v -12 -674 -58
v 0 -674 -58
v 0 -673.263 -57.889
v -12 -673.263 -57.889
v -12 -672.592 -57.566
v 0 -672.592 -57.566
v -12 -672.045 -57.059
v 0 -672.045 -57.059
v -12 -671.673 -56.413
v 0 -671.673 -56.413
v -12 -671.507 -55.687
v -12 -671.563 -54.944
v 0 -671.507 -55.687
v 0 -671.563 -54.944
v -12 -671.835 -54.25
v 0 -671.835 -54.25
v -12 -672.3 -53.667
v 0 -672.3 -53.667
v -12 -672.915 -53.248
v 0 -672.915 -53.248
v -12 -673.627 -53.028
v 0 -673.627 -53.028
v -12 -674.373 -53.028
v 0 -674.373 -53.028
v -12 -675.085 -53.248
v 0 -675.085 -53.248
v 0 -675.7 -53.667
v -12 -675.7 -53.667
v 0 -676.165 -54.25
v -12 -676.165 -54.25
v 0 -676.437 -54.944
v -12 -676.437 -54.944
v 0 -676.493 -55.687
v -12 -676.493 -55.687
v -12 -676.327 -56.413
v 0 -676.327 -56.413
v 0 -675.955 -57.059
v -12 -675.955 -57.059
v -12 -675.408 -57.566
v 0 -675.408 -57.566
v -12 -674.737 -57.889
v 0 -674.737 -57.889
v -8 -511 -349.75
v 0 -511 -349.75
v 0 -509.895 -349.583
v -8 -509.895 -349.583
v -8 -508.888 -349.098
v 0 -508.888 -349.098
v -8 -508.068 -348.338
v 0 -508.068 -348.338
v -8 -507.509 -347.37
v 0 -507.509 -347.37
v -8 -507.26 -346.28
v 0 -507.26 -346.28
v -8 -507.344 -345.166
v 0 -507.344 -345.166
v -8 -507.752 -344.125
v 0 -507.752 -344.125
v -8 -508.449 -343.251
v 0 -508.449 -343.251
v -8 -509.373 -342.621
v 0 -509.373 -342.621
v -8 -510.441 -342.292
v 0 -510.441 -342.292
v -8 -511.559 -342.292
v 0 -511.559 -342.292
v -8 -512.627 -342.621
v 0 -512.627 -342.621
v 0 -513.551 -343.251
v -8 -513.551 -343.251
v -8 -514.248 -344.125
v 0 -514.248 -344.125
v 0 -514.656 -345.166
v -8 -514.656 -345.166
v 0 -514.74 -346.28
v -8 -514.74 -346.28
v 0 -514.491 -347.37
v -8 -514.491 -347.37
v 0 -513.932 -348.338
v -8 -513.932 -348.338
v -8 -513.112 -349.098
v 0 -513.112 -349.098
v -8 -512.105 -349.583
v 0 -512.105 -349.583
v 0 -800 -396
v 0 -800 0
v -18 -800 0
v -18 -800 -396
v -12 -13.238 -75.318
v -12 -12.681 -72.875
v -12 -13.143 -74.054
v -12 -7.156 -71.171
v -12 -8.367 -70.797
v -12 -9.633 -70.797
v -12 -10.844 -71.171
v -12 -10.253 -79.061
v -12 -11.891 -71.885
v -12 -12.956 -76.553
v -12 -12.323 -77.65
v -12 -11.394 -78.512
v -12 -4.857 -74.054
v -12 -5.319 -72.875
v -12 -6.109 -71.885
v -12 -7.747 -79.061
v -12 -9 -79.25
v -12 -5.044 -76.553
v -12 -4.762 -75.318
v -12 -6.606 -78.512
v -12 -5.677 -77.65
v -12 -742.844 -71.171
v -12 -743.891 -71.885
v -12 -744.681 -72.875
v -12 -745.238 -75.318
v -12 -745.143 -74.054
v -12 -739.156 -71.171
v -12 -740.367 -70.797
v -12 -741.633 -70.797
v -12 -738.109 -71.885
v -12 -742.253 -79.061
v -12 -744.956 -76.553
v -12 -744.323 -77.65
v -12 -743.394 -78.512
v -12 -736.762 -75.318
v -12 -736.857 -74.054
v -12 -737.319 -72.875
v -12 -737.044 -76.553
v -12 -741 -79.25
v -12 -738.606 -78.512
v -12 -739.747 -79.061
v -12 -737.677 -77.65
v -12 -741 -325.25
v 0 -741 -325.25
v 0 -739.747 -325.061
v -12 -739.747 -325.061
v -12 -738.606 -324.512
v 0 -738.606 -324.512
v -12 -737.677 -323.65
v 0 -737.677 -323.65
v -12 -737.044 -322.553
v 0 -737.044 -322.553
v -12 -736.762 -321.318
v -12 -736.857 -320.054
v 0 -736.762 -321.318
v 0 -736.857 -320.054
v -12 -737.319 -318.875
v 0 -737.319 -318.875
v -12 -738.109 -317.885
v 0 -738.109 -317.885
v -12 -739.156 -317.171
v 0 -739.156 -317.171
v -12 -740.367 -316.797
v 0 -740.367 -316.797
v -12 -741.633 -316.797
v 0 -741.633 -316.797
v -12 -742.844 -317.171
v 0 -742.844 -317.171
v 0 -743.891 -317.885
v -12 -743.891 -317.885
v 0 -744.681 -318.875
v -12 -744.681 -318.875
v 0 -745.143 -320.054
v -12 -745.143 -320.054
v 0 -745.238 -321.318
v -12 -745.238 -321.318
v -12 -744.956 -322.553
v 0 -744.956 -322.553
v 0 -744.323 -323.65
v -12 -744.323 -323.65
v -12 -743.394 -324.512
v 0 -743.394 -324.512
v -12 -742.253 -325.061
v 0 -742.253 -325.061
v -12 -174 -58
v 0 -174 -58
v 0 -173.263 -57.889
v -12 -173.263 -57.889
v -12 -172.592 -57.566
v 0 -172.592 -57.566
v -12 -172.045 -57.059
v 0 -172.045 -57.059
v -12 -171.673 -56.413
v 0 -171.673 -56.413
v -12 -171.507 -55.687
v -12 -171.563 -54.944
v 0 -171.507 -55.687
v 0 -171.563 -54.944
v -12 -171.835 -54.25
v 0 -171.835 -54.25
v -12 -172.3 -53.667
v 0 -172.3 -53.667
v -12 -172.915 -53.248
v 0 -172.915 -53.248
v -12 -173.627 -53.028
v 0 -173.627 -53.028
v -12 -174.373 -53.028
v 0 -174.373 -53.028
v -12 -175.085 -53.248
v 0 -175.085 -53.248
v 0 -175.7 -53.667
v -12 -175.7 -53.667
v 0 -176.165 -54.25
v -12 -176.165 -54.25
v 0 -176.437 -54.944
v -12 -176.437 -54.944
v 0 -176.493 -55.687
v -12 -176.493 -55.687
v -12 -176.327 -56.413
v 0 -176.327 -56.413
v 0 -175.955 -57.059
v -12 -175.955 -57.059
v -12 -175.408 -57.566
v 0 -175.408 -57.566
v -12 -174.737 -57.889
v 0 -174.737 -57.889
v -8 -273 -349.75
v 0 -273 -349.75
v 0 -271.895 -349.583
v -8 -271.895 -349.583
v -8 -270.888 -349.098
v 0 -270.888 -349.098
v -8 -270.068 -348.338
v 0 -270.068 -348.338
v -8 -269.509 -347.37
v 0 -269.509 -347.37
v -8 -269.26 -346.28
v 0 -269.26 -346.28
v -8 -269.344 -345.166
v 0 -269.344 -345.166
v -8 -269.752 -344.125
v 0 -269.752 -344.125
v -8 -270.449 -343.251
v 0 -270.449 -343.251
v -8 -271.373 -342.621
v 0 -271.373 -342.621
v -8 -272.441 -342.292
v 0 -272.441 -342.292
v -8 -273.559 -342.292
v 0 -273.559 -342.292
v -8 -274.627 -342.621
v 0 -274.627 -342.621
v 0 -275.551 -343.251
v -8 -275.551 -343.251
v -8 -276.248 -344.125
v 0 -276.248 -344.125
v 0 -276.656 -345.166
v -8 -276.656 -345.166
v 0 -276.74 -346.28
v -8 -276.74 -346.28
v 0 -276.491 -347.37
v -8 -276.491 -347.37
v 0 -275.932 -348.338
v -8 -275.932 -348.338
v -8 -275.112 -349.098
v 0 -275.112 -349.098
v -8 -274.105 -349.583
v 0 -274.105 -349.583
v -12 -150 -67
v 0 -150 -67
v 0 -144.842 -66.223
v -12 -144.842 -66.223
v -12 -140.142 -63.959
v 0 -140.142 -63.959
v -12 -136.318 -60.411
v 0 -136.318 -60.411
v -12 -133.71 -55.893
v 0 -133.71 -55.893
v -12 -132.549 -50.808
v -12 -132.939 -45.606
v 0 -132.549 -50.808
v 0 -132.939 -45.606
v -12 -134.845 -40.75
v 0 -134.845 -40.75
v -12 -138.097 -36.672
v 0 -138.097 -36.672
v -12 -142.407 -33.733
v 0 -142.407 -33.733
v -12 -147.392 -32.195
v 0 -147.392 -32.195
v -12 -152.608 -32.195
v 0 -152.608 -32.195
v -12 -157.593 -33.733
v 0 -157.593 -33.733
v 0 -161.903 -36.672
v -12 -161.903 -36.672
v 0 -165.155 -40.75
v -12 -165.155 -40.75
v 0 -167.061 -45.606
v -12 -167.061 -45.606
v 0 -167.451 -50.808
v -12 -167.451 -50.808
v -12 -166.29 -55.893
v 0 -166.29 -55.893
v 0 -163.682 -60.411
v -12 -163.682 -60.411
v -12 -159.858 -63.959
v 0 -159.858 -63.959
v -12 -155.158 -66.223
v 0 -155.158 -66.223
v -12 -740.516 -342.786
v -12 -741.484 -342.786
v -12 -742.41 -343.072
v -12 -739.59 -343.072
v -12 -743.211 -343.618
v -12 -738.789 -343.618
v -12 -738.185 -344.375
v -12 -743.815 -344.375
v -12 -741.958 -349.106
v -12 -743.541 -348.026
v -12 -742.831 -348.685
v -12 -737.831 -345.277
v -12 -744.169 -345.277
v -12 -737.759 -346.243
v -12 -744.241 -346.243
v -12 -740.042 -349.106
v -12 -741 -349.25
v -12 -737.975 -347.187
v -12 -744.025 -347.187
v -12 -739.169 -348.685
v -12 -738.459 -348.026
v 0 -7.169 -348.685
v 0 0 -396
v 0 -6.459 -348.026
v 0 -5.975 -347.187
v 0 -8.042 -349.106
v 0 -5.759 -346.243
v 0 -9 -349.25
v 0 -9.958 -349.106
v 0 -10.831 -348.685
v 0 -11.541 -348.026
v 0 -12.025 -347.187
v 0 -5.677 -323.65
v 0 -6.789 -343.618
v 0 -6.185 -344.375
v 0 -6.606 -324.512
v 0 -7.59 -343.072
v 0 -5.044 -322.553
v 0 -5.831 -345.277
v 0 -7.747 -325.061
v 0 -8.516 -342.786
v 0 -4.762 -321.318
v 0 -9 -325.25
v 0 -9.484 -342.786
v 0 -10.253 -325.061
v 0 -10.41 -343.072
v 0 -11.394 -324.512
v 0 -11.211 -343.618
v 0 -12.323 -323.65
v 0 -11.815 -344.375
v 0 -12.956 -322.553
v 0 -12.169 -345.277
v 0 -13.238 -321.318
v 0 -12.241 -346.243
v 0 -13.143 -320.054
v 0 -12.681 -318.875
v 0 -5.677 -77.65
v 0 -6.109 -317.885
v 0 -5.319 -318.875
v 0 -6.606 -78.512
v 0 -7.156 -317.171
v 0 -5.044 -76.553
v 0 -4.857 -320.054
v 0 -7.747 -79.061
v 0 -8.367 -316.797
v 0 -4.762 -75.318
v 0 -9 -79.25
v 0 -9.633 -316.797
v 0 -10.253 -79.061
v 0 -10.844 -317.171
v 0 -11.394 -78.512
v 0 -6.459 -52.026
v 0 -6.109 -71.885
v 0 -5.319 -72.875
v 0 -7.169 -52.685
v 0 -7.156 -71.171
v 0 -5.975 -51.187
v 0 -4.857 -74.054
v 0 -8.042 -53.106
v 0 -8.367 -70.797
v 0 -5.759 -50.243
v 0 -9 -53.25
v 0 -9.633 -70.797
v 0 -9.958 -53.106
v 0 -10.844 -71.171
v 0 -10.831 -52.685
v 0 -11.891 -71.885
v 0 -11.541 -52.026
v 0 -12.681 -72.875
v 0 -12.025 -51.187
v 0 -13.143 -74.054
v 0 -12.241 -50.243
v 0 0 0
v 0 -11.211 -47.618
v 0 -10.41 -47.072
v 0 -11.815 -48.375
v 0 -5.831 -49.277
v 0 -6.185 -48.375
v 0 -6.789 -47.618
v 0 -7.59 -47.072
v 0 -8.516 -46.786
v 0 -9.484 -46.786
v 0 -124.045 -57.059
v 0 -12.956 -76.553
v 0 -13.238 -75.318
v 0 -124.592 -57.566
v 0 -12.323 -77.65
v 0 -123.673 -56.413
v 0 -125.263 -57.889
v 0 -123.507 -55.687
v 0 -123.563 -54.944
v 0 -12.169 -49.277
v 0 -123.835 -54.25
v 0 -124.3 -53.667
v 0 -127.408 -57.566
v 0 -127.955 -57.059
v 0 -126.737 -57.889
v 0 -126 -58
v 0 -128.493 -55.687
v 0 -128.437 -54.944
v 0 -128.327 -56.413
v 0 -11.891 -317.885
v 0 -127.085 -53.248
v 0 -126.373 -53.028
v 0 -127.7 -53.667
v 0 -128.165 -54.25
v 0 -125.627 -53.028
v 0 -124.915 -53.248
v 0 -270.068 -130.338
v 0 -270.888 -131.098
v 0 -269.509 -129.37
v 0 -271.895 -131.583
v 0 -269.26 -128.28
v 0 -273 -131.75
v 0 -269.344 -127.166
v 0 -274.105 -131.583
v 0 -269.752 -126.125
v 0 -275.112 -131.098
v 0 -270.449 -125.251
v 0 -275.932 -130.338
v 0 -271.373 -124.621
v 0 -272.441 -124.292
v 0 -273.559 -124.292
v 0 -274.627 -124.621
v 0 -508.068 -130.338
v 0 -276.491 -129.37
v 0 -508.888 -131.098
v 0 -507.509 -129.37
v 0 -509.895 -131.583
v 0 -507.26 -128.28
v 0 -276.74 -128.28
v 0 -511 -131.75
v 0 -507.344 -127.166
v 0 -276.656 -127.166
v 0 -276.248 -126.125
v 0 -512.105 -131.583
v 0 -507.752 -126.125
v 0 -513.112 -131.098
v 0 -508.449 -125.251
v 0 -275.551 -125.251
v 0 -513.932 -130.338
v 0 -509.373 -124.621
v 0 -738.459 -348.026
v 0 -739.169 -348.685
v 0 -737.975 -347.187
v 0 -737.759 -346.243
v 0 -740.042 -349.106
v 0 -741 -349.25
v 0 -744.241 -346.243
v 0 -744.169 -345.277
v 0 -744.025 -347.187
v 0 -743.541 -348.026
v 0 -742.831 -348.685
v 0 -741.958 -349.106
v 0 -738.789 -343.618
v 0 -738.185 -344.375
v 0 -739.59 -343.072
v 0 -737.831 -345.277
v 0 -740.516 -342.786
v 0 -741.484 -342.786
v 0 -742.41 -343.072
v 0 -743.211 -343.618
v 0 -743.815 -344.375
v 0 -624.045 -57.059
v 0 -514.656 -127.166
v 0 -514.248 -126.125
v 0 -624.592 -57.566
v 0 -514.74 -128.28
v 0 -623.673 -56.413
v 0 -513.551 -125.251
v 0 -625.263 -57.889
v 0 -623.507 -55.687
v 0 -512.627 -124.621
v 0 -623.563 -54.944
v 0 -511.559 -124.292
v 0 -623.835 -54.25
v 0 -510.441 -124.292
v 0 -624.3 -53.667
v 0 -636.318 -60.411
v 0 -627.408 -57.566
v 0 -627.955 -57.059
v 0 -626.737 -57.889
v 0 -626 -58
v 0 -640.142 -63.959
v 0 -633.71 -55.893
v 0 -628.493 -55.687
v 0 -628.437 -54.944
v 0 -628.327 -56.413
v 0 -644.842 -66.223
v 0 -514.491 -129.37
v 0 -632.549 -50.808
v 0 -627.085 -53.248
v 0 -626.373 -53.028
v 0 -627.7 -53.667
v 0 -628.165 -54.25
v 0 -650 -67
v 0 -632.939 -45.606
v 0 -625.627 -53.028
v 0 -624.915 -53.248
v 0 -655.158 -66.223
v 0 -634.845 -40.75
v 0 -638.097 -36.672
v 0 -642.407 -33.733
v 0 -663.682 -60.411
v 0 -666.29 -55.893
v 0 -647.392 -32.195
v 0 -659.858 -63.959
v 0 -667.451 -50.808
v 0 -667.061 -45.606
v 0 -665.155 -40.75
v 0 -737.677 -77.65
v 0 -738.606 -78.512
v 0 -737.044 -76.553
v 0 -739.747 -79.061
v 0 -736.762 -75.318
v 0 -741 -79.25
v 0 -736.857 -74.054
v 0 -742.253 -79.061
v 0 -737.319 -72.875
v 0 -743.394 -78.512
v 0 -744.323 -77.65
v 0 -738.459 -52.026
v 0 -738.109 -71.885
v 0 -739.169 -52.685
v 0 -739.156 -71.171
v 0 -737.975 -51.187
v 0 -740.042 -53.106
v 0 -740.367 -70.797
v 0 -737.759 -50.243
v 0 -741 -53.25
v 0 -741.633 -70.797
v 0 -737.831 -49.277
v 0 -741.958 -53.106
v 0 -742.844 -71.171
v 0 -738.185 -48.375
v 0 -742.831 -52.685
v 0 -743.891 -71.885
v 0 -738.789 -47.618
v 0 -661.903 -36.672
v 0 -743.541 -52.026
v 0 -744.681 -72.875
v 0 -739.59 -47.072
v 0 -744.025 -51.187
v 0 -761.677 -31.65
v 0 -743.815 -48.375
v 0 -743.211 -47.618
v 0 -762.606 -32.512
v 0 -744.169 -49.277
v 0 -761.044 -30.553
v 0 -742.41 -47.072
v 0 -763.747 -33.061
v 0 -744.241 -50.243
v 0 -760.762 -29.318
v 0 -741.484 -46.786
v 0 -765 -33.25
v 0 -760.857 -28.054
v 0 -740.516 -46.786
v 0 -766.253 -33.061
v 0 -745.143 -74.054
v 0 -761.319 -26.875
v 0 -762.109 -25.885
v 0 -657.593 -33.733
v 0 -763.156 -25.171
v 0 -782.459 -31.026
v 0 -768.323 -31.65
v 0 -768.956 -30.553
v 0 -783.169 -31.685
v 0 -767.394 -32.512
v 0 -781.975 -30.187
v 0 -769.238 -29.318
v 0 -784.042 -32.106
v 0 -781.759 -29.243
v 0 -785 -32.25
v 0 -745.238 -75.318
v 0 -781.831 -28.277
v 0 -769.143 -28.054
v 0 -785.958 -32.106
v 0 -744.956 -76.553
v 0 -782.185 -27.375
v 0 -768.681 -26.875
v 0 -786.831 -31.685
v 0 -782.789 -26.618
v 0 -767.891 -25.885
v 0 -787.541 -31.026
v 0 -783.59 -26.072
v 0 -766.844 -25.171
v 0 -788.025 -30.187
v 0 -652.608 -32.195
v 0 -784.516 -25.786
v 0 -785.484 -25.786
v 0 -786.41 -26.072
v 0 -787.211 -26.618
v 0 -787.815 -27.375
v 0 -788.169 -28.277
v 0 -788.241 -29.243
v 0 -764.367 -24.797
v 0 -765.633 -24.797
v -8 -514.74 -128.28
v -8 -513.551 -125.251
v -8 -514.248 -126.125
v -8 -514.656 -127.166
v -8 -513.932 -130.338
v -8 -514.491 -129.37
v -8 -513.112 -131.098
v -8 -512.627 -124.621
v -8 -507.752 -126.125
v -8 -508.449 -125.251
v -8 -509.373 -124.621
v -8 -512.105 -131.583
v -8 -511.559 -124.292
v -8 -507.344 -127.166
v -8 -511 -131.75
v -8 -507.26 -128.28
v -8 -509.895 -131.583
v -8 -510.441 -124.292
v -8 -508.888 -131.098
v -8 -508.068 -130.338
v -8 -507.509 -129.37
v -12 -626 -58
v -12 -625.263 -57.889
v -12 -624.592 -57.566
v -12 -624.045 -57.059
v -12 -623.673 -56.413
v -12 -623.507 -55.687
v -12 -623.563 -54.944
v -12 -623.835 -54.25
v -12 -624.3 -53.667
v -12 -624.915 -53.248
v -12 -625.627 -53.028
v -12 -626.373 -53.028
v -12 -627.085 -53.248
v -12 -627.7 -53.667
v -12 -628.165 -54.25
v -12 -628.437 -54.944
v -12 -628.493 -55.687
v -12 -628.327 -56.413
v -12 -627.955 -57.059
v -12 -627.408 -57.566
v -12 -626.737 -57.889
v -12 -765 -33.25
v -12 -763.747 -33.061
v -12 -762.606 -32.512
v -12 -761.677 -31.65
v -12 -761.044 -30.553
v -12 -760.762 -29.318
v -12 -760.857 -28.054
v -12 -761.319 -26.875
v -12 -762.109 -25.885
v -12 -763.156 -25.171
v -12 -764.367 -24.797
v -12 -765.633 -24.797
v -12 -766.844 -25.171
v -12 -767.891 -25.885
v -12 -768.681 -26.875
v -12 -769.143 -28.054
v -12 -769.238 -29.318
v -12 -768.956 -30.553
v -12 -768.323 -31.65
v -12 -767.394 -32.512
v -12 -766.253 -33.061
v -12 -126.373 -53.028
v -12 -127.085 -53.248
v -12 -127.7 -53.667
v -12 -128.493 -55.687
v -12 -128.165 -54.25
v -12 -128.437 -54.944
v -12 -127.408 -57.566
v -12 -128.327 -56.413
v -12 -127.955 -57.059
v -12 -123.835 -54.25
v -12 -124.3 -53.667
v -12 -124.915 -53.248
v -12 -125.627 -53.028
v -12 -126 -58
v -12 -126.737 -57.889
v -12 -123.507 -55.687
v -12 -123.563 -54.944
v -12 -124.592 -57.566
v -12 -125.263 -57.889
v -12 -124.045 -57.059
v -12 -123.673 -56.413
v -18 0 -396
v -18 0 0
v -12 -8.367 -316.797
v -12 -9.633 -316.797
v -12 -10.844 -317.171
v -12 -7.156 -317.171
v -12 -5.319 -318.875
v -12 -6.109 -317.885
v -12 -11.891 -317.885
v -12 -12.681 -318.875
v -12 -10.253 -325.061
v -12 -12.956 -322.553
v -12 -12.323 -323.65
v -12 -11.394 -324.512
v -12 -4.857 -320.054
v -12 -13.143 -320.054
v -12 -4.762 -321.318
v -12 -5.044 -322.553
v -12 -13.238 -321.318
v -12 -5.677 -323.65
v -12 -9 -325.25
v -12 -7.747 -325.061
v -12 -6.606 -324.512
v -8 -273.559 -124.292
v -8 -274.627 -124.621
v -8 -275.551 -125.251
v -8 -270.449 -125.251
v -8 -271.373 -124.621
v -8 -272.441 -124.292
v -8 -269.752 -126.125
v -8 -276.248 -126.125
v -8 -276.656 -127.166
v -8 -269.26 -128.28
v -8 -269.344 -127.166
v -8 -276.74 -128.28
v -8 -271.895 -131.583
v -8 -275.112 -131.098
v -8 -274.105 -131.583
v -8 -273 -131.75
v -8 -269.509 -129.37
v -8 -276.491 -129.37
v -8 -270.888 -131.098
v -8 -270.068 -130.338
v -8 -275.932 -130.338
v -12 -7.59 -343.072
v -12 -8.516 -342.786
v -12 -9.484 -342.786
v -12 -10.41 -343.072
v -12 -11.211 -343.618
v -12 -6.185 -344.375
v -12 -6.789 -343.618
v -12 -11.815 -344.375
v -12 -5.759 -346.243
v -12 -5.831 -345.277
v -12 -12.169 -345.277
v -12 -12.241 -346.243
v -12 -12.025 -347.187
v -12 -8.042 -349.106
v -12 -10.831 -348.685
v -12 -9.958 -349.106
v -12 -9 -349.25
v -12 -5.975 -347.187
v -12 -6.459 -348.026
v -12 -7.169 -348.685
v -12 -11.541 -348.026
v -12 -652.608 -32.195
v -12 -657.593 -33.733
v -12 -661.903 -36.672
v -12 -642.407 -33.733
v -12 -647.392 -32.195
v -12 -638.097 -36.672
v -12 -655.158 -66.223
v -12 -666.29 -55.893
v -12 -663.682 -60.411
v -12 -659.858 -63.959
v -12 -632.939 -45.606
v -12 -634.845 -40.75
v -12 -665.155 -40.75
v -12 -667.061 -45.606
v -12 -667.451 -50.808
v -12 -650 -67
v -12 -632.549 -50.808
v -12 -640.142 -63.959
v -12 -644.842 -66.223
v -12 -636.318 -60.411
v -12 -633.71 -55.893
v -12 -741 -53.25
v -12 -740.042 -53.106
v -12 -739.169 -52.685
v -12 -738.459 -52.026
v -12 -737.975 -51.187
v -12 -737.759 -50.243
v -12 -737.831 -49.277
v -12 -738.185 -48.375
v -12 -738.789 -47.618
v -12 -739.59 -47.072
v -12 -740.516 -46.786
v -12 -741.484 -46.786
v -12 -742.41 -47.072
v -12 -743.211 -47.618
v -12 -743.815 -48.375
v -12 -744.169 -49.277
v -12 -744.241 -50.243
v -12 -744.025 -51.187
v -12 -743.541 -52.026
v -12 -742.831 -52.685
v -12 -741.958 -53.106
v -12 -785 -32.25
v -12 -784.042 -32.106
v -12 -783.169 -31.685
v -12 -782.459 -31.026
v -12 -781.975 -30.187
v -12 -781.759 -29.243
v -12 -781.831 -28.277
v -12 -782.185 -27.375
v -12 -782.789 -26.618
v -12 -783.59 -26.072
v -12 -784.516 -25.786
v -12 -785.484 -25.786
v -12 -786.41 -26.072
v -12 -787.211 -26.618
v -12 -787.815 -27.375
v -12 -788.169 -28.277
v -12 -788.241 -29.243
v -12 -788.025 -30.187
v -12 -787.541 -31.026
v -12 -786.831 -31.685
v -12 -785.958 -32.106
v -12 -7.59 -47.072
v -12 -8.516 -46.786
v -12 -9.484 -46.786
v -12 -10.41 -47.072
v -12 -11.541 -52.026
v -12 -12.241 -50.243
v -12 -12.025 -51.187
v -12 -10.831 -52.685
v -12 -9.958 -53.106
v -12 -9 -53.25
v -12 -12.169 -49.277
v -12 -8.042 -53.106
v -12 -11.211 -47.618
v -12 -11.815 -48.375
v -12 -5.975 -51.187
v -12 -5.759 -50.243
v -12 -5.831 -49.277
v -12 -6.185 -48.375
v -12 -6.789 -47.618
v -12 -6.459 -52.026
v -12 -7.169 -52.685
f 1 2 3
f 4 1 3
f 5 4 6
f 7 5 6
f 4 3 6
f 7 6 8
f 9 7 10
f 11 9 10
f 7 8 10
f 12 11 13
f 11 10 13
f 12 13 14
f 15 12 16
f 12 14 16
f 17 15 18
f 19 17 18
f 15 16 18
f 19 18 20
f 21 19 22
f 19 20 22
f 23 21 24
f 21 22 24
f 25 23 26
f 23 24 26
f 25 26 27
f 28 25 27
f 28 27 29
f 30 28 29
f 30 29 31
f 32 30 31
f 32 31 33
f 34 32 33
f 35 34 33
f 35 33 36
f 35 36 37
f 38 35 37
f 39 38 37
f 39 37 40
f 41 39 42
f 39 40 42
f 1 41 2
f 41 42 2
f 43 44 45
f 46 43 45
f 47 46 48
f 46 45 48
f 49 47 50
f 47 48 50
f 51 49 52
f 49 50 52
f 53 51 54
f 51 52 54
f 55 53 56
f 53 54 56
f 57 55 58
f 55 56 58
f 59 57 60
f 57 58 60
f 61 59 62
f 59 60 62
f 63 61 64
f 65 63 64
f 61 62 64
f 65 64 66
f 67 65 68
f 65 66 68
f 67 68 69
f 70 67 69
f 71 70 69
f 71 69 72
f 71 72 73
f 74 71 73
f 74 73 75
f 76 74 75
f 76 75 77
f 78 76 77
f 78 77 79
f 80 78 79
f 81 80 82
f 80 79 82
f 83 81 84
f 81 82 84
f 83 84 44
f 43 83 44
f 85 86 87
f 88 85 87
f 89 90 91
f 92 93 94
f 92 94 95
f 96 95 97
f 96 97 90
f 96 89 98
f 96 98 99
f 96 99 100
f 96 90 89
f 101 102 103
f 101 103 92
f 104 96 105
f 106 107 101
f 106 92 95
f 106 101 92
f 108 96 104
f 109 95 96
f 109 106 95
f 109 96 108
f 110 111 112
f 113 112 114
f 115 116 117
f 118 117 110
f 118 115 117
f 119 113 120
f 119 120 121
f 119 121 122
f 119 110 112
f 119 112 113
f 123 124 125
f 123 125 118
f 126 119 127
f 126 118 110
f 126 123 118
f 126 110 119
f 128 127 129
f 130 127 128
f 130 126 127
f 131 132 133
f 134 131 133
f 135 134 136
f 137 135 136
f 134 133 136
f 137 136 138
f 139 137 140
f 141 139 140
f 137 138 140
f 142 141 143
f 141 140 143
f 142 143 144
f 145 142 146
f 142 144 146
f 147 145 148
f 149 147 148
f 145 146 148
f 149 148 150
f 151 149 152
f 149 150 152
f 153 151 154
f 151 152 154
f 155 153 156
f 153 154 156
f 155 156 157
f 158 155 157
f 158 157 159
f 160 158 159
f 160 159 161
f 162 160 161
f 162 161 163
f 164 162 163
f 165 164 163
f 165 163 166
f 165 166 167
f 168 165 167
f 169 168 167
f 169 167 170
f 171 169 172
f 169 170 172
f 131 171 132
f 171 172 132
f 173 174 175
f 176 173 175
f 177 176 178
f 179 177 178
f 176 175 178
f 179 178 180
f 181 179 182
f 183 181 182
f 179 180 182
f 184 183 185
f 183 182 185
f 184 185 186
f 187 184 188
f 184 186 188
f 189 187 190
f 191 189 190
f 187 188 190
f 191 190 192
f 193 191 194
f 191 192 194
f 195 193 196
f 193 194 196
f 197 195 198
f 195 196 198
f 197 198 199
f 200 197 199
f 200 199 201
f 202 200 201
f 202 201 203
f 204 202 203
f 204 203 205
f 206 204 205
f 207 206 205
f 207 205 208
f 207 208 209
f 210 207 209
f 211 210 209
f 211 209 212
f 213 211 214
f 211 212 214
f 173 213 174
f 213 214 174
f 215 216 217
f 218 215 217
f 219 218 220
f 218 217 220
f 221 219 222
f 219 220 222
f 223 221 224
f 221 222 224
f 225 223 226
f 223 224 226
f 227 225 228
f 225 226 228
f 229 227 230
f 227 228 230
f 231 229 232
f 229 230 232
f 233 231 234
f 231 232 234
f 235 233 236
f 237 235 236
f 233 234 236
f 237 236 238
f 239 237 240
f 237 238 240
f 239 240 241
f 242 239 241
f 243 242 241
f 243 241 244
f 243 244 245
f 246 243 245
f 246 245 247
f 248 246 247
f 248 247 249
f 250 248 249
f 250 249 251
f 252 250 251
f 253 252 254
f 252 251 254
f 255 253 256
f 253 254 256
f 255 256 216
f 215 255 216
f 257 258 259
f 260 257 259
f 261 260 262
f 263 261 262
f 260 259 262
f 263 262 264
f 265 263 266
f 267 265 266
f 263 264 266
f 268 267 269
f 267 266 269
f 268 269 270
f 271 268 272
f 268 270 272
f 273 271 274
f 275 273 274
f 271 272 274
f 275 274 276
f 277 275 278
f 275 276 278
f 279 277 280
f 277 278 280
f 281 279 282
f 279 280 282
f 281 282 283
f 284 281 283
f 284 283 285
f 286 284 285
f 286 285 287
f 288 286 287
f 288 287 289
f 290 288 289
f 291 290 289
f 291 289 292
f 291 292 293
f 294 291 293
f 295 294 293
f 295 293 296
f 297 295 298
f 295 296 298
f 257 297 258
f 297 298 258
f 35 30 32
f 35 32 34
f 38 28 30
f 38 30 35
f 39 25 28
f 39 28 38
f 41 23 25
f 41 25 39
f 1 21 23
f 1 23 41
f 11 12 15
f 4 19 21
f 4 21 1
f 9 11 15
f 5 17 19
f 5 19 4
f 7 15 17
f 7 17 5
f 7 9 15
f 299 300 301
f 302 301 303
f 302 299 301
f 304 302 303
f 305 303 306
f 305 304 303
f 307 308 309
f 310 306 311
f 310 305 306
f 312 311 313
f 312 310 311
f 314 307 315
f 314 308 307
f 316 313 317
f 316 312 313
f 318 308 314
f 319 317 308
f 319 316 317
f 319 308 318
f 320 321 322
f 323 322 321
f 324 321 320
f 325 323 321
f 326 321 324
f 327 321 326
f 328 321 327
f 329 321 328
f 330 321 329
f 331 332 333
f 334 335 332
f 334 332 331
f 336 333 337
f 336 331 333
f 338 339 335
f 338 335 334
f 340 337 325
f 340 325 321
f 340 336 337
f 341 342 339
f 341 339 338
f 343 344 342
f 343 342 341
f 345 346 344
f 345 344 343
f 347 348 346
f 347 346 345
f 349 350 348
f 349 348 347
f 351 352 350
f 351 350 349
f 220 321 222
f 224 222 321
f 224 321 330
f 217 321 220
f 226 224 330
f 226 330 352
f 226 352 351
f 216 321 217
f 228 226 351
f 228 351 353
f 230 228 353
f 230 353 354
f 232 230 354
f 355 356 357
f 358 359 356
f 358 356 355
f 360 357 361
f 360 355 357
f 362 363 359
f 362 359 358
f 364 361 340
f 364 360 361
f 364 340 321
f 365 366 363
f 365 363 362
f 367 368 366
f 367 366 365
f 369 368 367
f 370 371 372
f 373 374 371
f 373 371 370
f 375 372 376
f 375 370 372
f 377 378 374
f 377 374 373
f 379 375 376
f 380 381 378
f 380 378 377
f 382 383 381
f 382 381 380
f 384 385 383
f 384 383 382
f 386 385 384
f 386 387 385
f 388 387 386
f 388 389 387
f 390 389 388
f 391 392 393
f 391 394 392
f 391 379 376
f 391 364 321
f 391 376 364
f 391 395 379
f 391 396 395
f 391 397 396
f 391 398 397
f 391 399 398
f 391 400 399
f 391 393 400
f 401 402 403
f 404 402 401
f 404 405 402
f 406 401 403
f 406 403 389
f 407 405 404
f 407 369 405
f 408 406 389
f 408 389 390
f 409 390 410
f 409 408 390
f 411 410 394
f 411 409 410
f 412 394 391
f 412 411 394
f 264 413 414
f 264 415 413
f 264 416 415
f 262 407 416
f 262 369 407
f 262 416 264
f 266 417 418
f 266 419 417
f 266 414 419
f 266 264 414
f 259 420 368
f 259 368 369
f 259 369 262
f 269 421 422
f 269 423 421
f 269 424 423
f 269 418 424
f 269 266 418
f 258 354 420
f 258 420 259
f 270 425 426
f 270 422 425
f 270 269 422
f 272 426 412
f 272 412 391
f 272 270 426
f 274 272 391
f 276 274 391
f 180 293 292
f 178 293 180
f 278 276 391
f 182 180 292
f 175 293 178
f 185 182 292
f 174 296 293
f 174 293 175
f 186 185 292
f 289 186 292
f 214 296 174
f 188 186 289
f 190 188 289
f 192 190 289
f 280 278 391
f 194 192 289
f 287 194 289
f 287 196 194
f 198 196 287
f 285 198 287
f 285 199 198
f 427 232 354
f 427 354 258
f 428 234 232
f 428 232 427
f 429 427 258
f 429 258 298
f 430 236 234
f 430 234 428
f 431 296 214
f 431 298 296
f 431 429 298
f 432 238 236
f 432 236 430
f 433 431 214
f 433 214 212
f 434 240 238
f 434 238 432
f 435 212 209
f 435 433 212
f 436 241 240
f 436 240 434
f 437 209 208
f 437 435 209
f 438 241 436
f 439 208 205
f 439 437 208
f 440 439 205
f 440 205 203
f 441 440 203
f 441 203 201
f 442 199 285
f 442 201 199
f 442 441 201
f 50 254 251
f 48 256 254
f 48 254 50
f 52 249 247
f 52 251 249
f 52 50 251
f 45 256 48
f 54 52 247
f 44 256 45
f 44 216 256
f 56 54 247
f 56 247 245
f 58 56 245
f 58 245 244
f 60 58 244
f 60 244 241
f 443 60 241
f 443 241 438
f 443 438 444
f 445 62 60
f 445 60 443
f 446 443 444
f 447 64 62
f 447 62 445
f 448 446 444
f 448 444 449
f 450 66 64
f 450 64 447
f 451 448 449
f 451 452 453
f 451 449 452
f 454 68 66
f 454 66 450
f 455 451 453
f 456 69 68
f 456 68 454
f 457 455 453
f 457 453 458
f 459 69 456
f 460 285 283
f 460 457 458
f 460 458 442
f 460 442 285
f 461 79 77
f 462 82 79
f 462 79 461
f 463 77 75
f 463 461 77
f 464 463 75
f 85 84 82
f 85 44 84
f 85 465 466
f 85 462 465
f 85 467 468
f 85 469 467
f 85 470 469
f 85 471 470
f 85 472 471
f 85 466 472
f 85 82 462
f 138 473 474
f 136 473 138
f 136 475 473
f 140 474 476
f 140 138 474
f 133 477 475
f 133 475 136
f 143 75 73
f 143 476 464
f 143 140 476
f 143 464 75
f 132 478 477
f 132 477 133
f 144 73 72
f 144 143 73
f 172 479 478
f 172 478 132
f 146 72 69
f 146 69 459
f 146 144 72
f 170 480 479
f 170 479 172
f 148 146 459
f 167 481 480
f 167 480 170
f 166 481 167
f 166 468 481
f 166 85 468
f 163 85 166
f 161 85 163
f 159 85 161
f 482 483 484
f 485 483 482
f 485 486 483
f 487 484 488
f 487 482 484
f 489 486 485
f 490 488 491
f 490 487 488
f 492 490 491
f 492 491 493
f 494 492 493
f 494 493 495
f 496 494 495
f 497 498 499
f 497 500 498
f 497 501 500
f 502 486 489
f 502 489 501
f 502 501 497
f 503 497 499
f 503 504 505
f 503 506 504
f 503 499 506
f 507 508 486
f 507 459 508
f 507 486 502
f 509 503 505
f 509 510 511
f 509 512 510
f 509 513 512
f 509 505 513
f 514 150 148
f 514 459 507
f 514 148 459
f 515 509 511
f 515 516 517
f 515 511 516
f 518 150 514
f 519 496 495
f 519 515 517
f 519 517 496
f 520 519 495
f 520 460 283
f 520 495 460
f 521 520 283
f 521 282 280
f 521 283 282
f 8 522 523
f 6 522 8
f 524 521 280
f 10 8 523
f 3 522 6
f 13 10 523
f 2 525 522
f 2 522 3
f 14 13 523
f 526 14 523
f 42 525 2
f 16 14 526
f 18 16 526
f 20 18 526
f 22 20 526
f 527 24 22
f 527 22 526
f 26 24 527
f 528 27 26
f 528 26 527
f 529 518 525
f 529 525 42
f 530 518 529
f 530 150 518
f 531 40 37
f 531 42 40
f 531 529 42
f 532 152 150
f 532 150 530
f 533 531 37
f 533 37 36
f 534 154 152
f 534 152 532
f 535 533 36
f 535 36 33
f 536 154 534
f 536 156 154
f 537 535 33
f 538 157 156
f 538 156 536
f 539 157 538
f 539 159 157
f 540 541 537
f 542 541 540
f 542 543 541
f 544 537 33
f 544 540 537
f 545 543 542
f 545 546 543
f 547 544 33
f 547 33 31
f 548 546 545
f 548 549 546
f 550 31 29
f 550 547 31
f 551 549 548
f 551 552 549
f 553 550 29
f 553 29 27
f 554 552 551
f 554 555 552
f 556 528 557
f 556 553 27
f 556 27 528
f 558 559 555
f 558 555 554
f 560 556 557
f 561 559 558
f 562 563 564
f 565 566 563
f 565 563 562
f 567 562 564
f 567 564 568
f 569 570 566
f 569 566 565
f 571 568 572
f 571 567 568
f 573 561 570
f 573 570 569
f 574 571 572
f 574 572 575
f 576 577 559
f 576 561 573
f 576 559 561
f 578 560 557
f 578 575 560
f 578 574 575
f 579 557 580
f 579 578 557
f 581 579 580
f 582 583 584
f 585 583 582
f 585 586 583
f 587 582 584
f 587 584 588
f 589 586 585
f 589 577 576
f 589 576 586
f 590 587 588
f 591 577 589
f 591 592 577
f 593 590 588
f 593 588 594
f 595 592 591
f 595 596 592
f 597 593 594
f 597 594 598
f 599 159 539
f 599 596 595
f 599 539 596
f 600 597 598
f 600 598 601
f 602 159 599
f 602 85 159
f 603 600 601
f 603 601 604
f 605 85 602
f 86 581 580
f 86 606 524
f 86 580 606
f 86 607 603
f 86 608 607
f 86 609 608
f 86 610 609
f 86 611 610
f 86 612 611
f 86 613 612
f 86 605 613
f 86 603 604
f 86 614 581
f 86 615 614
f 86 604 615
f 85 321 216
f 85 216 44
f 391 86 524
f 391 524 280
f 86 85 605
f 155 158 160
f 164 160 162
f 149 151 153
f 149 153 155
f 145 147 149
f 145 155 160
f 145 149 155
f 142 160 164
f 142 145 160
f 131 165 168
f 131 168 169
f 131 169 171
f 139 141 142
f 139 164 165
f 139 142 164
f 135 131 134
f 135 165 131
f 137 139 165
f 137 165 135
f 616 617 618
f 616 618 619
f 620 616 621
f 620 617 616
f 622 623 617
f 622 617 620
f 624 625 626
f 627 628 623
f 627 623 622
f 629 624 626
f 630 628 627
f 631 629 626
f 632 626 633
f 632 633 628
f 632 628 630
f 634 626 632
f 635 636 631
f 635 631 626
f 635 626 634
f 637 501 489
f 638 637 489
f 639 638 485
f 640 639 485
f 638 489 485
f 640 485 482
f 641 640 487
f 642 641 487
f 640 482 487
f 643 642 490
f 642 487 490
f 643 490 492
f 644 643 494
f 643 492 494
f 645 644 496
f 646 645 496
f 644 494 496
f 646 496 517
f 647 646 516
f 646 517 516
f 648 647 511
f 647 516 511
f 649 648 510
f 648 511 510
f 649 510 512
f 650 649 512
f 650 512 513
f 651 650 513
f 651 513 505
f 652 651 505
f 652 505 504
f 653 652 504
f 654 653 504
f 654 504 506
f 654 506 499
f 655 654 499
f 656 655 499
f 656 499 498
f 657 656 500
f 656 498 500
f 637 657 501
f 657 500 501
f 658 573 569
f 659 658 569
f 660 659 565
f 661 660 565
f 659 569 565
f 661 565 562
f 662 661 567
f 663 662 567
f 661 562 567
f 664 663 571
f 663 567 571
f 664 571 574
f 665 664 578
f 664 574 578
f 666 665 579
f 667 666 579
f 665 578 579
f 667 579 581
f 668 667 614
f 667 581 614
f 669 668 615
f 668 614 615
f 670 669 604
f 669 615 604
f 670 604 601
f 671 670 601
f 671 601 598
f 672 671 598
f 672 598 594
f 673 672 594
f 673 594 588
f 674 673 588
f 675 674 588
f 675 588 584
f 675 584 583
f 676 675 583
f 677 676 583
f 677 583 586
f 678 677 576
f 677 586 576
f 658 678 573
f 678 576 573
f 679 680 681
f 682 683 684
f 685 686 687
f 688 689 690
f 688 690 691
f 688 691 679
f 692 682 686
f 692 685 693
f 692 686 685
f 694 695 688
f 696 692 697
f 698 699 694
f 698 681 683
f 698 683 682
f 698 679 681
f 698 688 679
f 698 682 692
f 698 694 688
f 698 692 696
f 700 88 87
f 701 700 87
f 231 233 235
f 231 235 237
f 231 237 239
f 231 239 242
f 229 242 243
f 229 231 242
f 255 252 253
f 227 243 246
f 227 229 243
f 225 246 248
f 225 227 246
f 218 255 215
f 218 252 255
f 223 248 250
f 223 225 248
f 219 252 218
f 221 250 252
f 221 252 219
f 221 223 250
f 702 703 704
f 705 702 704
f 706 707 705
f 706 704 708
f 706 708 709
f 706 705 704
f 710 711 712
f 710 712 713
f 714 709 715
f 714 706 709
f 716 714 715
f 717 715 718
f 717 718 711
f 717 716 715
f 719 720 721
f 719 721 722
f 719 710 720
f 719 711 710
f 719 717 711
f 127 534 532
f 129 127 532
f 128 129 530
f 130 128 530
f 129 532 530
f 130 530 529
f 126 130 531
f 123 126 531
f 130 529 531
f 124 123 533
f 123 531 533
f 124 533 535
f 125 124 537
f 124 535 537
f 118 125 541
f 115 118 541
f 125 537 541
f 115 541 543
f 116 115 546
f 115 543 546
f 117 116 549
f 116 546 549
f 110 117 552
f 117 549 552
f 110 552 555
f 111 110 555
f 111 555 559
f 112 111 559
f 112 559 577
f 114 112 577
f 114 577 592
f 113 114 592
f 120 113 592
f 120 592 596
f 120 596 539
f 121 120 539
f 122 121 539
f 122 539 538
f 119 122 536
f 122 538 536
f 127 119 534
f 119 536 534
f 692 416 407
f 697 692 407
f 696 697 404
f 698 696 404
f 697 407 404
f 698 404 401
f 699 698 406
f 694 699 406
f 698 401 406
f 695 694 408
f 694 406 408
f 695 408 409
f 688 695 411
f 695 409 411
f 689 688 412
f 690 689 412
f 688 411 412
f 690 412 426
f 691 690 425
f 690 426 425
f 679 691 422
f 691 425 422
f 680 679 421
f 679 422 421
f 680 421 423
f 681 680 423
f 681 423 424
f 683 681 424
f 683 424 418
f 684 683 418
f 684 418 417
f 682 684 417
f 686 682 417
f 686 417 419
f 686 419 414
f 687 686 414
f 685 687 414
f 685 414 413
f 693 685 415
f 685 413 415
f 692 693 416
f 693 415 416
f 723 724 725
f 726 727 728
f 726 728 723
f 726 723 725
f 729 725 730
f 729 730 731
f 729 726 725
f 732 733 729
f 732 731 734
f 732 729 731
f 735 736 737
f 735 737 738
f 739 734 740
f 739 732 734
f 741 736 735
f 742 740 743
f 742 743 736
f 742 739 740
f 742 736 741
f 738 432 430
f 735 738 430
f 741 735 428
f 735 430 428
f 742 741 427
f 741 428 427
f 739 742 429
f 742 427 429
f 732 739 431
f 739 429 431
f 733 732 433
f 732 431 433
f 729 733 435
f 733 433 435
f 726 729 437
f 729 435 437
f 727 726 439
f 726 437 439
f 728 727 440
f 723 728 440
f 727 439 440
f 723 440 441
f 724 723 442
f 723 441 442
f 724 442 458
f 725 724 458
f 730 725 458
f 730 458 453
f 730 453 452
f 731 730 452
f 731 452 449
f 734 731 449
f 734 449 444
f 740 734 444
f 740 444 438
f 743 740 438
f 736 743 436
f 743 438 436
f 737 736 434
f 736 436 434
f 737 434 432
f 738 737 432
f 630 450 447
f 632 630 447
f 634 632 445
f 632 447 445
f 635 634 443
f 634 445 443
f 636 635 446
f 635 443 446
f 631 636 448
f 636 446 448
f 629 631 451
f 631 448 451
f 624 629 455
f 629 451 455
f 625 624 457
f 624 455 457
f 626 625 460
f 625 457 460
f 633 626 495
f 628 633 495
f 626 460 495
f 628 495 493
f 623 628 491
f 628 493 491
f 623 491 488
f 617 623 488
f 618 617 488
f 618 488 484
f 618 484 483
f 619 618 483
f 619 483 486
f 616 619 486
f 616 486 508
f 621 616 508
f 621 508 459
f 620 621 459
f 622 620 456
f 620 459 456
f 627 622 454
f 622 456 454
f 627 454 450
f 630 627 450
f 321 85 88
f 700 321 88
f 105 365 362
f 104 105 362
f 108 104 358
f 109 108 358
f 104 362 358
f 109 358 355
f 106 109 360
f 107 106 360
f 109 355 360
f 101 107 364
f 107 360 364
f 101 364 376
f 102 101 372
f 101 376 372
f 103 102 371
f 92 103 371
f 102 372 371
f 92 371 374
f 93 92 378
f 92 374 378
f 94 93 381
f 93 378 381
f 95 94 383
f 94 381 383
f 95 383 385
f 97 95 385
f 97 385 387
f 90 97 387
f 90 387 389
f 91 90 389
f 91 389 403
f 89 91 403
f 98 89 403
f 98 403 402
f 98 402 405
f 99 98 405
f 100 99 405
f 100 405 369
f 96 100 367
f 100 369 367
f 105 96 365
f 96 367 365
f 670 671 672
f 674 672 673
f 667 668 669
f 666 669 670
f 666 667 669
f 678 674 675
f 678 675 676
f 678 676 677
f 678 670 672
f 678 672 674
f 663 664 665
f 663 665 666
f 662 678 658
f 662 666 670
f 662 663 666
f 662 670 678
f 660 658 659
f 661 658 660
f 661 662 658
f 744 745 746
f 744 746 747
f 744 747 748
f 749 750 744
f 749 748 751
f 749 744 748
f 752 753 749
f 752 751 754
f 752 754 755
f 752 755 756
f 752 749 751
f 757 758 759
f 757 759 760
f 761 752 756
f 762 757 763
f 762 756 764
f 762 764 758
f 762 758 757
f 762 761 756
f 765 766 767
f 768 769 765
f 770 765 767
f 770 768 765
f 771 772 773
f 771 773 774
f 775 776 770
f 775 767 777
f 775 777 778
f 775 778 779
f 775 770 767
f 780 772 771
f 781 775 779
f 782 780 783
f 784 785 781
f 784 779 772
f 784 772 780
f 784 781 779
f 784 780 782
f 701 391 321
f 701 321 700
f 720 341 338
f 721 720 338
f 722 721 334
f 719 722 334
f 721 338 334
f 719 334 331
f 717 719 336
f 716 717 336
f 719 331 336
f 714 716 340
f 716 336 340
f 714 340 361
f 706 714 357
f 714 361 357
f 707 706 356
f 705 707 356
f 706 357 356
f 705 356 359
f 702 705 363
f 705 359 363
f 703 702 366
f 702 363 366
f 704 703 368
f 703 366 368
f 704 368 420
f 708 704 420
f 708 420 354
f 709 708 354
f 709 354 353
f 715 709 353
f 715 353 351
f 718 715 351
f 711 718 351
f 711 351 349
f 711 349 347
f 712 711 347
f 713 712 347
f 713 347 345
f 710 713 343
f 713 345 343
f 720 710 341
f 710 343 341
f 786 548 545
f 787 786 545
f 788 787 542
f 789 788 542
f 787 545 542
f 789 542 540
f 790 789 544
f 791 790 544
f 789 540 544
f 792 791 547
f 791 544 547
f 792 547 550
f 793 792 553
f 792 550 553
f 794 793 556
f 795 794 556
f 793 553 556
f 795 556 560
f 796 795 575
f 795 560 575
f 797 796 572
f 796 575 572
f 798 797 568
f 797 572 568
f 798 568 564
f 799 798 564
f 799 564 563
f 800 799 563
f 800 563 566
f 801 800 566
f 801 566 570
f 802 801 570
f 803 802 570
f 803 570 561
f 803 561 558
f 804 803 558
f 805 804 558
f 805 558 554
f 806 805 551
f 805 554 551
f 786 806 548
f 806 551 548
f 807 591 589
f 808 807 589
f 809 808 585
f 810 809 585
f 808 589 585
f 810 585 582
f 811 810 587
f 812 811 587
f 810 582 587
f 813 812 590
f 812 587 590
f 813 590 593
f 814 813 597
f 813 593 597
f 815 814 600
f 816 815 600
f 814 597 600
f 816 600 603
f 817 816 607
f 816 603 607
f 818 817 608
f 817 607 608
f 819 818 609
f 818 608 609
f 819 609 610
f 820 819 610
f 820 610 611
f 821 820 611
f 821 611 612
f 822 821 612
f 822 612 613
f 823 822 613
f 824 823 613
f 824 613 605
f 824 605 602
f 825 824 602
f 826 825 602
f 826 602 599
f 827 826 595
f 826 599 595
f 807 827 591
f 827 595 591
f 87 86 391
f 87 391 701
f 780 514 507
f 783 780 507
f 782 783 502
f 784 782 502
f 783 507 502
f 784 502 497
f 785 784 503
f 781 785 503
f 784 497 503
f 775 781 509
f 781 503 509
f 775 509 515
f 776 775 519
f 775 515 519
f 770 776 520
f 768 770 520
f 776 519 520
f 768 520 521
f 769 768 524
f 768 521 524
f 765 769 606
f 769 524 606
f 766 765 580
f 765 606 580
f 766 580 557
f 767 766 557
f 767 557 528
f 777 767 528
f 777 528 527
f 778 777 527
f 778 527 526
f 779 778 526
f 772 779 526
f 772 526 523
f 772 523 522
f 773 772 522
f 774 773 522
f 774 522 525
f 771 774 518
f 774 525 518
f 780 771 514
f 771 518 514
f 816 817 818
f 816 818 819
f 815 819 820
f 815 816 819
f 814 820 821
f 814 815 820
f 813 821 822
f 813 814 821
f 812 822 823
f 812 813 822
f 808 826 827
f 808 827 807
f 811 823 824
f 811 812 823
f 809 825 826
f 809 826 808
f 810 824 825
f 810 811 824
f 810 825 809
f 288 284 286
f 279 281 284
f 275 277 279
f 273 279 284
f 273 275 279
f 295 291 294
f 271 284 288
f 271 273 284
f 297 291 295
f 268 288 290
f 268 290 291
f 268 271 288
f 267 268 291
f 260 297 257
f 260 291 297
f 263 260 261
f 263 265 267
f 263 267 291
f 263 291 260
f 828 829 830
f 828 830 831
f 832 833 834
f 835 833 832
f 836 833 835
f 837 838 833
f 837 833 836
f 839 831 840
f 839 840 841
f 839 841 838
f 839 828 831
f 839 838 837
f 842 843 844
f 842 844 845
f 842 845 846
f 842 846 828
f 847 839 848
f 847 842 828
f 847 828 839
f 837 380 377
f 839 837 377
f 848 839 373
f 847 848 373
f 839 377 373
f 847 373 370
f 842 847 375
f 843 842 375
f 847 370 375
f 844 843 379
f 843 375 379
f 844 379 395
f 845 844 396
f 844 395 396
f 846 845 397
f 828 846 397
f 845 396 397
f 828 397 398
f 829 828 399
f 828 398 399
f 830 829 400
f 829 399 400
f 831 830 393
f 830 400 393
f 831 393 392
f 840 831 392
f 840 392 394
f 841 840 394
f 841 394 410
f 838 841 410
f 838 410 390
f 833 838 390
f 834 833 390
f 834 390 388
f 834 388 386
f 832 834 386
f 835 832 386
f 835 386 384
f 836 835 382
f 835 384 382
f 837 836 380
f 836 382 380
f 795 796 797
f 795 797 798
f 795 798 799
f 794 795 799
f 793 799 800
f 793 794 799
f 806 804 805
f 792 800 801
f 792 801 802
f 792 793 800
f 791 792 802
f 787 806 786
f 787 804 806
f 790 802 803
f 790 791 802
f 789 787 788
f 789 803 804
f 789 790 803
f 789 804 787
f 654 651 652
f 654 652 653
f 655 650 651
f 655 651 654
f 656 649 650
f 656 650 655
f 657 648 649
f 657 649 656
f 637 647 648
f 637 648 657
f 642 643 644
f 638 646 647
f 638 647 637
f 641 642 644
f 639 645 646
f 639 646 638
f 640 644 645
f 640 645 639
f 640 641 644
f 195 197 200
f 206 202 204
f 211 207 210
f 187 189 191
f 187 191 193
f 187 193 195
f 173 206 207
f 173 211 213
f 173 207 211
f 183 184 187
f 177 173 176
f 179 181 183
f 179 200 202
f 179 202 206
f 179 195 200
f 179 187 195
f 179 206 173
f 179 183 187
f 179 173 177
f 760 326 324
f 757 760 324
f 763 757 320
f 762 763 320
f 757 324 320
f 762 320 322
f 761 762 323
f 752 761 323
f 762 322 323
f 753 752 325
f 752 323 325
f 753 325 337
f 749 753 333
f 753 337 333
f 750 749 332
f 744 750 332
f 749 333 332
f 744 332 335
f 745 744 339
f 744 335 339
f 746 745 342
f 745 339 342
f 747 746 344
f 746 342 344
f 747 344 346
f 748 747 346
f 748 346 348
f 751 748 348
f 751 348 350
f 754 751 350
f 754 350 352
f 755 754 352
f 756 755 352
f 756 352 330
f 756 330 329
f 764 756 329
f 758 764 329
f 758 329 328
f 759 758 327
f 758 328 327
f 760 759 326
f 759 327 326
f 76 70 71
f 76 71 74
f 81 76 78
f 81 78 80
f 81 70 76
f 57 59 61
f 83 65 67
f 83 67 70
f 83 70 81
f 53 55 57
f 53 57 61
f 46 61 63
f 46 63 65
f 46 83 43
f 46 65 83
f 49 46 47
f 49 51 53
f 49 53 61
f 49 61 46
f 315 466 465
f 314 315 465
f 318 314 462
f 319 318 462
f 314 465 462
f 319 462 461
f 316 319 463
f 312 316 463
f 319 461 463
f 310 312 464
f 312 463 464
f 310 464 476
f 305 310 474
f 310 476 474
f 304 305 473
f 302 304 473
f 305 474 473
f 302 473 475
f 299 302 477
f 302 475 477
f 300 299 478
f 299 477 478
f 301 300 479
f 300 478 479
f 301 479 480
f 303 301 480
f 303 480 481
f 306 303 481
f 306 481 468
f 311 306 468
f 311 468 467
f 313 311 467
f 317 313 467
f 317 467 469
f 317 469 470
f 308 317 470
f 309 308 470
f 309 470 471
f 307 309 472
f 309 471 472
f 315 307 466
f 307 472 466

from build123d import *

# Parameters (mm, degrees)
SKETCH1_W                      = 18
SKETCH1_H                      = 396
LEFT_HAND_END_DEPTH            = 800
SKETCH3_R                      = 3.75
SHELF_MOUNT_HOLES_DEPTH        = 8
SKETCH2_R                      = 3.25
SKETCH2_R_2                    = 4.25
BASE_AND_TOP_MOUNT_HOLES_DEPTH = 12
SKETCH4_R                      = 17.5
SKETCH4_R_2                    = 2.5
HINGE_HOLES_DEPTH              = 12


with BuildPart() as part:
    # Sketch1 → Left Hand End (new body)
    with BuildSketch(Plane(origin=(0, -800, 0), x_dir=(-1, 0, 0), z_dir=(0, 1, 0))):
        with Locations((9, -198)):
            Rectangle(SKETCH1_W, SKETCH1_H)
    extrude(amount=LEFT_HAND_END_DEPTH)

    # Sketch3 → Shelf Mount Holes (cut)
    with BuildSketch(Plane(origin=(0, 0, 0), x_dir=(0, 0, -1), z_dir=(1, 0, 0))):
        with Locations((128, -511)):
            Circle(SKETCH3_R)
        with Locations((346, -511)):
            Circle(SKETCH3_R)
        with Locations((346, -273)):
            Circle(SKETCH3_R)
        with Locations((128, -273)):
            Circle(SKETCH3_R)
    extrude(amount=-SHELF_MOUNT_HOLES_DEPTH, mode=Mode.SUBTRACT)

    # Sketch2 → Base and Top Mount Holes (cut)
    with BuildSketch(Plane(origin=(0, 0, 0), x_dir=(0, 0, -1), z_dir=(1, 0, 0))):
        with Locations((50, -9)):
            Circle(SKETCH2_R)
        with Locations((346, -9)):
            Circle(SKETCH2_R)
        with Locations((75, -9)):
            Circle(SKETCH2_R_2)
        with Locations((321, -9)):
            Circle(SKETCH2_R_2)
        with Locations((50, -741)):
            Circle(SKETCH2_R)
        with Locations((75, -741)):
            Circle(SKETCH2_R_2)
        with Locations((321, -741)):
            Circle(SKETCH2_R_2)
        with Locations((346, -741)):
            Circle(SKETCH2_R)
        with Locations((29, -765)):
            Circle(SKETCH2_R_2)
        with Locations((29, -785)):
            Circle(SKETCH2_R)
    extrude(amount=-BASE_AND_TOP_MOUNT_HOLES_DEPTH, mode=Mode.SUBTRACT)

    # Sketch4 → Hinge Holes (cut)
    with BuildSketch(Plane(origin=(0, 0, 0), x_dir=(0, 0, -1), z_dir=(1, 0, 0))):
        with Locations((49.5, -650)):
            Circle(SKETCH4_R)
        with Locations((55.5, -626)):
            Circle(SKETCH4_R_2)
        with Locations((55.5, -674)):
            Circle(SKETCH4_R_2)
        with Locations((49.5, -150)):
            Circle(SKETCH4_R)
        with Locations((55.5, -126)):
            Circle(SKETCH4_R_2)
        with Locations((55.5, -174)):
            Circle(SKETCH4_R_2)
    extrude(amount=-HINGE_HOLES_DEPTH, mode=Mode.SUBTRACT)


solid = part.part
